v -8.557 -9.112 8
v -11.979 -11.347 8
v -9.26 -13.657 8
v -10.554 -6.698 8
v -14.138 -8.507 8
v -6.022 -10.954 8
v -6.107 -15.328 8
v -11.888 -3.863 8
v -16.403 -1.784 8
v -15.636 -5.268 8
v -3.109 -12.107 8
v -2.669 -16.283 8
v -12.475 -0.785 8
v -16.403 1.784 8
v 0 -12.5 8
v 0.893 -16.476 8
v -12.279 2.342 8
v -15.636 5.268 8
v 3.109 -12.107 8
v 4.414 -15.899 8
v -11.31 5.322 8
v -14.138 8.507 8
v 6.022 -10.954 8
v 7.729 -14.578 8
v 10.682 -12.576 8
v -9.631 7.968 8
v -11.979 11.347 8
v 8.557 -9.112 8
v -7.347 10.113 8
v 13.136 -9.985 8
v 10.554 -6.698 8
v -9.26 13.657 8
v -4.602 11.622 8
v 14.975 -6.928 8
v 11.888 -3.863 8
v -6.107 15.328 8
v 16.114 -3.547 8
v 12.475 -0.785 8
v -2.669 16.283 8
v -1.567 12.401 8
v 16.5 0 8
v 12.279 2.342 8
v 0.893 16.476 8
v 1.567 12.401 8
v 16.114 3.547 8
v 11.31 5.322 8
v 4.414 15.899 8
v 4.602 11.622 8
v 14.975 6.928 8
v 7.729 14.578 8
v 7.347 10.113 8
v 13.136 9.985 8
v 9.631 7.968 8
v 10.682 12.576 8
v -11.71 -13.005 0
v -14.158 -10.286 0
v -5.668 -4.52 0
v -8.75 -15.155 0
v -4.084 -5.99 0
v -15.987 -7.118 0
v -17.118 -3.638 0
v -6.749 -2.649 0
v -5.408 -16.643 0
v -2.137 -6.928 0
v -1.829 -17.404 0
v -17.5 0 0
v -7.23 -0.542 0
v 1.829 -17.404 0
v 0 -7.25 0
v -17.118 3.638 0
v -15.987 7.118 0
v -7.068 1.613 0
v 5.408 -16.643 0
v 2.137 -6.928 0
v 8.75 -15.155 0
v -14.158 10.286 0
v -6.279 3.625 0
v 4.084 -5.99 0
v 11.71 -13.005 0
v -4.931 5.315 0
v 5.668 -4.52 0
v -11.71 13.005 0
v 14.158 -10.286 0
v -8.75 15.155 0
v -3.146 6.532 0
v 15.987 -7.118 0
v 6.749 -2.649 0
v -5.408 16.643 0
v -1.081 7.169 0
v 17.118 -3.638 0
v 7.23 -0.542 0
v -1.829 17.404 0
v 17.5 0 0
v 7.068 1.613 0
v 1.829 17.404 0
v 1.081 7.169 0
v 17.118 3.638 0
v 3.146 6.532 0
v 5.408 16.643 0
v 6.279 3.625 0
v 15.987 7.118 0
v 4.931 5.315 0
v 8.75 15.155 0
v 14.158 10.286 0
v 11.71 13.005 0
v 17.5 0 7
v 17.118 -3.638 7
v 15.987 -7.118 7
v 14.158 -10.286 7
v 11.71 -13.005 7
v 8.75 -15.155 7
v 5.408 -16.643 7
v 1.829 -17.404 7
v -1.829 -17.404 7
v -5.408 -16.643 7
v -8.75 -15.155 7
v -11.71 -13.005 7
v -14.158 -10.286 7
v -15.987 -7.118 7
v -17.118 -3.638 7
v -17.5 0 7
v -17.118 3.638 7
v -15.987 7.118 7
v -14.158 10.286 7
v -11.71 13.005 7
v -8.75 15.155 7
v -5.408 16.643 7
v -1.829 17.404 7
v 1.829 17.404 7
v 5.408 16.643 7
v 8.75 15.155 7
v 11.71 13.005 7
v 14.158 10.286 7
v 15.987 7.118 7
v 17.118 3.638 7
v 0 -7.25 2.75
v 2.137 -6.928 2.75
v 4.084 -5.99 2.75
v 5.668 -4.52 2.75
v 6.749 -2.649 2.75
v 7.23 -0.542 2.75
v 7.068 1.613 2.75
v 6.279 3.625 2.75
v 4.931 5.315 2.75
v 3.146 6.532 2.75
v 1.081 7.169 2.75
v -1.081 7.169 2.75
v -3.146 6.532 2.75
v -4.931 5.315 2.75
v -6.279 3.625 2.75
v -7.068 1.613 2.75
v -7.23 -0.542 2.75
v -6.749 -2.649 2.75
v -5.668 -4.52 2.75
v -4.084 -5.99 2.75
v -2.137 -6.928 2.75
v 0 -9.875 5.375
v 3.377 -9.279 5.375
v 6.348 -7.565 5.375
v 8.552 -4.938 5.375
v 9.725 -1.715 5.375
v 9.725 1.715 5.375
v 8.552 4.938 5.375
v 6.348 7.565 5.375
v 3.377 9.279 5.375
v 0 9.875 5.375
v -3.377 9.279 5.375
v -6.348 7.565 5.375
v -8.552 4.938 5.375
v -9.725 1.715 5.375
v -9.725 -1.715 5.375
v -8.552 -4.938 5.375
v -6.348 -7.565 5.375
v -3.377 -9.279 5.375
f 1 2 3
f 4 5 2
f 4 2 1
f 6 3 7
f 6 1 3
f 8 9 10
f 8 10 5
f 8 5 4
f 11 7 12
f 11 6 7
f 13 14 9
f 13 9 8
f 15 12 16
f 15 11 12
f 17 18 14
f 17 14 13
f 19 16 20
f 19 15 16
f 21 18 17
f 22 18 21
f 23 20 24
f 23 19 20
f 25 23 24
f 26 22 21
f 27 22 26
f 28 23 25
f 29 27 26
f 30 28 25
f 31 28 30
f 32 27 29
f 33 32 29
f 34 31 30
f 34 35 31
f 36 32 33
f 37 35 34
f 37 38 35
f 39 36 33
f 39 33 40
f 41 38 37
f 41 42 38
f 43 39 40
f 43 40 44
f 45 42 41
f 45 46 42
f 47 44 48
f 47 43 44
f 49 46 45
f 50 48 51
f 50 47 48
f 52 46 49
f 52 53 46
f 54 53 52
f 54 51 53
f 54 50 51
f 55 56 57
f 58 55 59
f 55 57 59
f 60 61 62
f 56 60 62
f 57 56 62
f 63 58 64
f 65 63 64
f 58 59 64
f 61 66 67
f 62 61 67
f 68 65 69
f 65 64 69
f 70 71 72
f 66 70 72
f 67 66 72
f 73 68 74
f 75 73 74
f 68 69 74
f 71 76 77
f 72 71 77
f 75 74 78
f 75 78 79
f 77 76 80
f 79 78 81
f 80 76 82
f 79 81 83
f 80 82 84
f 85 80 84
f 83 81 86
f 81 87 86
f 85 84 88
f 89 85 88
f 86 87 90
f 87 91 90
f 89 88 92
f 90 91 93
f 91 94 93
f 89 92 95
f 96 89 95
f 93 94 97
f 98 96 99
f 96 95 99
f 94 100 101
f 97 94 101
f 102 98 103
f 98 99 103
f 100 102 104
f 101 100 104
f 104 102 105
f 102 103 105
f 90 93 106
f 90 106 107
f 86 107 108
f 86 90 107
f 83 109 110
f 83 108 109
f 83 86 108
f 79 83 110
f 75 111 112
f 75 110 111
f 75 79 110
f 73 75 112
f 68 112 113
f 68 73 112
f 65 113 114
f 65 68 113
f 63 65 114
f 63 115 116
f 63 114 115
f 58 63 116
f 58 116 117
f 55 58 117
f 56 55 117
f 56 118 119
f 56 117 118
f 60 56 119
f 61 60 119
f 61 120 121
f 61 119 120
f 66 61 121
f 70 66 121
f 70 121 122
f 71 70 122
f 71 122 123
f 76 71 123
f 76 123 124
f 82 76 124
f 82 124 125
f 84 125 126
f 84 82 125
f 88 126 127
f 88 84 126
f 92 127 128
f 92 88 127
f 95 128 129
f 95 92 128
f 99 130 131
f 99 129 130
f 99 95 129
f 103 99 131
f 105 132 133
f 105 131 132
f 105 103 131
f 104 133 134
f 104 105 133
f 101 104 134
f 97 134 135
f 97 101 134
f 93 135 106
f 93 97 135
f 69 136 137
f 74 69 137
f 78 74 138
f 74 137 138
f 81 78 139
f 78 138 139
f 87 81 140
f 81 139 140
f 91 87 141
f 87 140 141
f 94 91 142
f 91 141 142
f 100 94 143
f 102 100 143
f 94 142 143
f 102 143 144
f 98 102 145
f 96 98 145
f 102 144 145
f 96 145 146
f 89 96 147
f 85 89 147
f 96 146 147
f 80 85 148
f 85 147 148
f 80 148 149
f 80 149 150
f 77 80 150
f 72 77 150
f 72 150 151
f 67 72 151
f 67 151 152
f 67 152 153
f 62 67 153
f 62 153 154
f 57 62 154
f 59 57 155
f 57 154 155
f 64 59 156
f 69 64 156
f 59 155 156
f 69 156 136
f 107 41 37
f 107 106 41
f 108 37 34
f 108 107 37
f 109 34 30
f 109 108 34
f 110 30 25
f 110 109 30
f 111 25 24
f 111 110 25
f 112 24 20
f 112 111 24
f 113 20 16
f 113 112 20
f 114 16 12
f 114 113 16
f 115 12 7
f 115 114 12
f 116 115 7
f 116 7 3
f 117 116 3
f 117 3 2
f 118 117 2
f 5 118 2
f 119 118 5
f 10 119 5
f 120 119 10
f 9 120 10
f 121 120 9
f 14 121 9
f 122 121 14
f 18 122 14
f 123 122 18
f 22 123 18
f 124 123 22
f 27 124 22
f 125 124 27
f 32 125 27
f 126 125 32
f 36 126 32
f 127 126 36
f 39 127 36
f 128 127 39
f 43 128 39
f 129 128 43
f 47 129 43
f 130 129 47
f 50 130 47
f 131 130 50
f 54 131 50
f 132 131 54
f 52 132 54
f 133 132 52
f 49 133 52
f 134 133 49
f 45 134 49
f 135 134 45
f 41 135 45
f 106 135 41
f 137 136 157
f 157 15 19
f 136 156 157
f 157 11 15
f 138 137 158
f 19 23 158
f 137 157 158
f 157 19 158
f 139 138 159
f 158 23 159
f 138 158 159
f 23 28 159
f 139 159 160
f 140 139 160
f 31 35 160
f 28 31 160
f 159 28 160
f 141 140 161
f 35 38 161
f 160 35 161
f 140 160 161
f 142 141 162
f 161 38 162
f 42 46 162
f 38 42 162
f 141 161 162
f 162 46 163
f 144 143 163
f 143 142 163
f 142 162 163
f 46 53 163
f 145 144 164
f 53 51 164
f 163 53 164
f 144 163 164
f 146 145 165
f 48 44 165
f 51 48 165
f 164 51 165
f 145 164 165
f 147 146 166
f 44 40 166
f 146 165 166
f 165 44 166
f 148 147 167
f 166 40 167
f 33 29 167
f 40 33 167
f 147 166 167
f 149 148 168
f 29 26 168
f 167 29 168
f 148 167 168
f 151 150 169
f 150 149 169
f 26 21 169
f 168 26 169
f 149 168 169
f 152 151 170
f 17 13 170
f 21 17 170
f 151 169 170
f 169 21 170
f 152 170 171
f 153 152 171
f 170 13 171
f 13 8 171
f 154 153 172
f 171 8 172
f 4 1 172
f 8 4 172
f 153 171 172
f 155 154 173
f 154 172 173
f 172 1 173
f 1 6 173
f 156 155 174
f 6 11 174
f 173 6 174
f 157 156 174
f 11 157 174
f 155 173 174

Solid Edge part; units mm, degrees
sketch "Sketch1" plane through (0, 0, 0) normal (0, 0, 1) x (1, 0, 0)
  circle A0 centre (0, 0) radius 17.5
extrude "Protrusion1" add sketch "Sketch1" along normal blind 8
hole "Hole_1" at (0, 0, 8) direction (0, 0, -1) diameter 14.5 end up to next countersink diameter 25 countersink angle 90
chamfer "Chamfer_1" distance 1 angle 45 1 edges at (-17.5, 0, 8)
